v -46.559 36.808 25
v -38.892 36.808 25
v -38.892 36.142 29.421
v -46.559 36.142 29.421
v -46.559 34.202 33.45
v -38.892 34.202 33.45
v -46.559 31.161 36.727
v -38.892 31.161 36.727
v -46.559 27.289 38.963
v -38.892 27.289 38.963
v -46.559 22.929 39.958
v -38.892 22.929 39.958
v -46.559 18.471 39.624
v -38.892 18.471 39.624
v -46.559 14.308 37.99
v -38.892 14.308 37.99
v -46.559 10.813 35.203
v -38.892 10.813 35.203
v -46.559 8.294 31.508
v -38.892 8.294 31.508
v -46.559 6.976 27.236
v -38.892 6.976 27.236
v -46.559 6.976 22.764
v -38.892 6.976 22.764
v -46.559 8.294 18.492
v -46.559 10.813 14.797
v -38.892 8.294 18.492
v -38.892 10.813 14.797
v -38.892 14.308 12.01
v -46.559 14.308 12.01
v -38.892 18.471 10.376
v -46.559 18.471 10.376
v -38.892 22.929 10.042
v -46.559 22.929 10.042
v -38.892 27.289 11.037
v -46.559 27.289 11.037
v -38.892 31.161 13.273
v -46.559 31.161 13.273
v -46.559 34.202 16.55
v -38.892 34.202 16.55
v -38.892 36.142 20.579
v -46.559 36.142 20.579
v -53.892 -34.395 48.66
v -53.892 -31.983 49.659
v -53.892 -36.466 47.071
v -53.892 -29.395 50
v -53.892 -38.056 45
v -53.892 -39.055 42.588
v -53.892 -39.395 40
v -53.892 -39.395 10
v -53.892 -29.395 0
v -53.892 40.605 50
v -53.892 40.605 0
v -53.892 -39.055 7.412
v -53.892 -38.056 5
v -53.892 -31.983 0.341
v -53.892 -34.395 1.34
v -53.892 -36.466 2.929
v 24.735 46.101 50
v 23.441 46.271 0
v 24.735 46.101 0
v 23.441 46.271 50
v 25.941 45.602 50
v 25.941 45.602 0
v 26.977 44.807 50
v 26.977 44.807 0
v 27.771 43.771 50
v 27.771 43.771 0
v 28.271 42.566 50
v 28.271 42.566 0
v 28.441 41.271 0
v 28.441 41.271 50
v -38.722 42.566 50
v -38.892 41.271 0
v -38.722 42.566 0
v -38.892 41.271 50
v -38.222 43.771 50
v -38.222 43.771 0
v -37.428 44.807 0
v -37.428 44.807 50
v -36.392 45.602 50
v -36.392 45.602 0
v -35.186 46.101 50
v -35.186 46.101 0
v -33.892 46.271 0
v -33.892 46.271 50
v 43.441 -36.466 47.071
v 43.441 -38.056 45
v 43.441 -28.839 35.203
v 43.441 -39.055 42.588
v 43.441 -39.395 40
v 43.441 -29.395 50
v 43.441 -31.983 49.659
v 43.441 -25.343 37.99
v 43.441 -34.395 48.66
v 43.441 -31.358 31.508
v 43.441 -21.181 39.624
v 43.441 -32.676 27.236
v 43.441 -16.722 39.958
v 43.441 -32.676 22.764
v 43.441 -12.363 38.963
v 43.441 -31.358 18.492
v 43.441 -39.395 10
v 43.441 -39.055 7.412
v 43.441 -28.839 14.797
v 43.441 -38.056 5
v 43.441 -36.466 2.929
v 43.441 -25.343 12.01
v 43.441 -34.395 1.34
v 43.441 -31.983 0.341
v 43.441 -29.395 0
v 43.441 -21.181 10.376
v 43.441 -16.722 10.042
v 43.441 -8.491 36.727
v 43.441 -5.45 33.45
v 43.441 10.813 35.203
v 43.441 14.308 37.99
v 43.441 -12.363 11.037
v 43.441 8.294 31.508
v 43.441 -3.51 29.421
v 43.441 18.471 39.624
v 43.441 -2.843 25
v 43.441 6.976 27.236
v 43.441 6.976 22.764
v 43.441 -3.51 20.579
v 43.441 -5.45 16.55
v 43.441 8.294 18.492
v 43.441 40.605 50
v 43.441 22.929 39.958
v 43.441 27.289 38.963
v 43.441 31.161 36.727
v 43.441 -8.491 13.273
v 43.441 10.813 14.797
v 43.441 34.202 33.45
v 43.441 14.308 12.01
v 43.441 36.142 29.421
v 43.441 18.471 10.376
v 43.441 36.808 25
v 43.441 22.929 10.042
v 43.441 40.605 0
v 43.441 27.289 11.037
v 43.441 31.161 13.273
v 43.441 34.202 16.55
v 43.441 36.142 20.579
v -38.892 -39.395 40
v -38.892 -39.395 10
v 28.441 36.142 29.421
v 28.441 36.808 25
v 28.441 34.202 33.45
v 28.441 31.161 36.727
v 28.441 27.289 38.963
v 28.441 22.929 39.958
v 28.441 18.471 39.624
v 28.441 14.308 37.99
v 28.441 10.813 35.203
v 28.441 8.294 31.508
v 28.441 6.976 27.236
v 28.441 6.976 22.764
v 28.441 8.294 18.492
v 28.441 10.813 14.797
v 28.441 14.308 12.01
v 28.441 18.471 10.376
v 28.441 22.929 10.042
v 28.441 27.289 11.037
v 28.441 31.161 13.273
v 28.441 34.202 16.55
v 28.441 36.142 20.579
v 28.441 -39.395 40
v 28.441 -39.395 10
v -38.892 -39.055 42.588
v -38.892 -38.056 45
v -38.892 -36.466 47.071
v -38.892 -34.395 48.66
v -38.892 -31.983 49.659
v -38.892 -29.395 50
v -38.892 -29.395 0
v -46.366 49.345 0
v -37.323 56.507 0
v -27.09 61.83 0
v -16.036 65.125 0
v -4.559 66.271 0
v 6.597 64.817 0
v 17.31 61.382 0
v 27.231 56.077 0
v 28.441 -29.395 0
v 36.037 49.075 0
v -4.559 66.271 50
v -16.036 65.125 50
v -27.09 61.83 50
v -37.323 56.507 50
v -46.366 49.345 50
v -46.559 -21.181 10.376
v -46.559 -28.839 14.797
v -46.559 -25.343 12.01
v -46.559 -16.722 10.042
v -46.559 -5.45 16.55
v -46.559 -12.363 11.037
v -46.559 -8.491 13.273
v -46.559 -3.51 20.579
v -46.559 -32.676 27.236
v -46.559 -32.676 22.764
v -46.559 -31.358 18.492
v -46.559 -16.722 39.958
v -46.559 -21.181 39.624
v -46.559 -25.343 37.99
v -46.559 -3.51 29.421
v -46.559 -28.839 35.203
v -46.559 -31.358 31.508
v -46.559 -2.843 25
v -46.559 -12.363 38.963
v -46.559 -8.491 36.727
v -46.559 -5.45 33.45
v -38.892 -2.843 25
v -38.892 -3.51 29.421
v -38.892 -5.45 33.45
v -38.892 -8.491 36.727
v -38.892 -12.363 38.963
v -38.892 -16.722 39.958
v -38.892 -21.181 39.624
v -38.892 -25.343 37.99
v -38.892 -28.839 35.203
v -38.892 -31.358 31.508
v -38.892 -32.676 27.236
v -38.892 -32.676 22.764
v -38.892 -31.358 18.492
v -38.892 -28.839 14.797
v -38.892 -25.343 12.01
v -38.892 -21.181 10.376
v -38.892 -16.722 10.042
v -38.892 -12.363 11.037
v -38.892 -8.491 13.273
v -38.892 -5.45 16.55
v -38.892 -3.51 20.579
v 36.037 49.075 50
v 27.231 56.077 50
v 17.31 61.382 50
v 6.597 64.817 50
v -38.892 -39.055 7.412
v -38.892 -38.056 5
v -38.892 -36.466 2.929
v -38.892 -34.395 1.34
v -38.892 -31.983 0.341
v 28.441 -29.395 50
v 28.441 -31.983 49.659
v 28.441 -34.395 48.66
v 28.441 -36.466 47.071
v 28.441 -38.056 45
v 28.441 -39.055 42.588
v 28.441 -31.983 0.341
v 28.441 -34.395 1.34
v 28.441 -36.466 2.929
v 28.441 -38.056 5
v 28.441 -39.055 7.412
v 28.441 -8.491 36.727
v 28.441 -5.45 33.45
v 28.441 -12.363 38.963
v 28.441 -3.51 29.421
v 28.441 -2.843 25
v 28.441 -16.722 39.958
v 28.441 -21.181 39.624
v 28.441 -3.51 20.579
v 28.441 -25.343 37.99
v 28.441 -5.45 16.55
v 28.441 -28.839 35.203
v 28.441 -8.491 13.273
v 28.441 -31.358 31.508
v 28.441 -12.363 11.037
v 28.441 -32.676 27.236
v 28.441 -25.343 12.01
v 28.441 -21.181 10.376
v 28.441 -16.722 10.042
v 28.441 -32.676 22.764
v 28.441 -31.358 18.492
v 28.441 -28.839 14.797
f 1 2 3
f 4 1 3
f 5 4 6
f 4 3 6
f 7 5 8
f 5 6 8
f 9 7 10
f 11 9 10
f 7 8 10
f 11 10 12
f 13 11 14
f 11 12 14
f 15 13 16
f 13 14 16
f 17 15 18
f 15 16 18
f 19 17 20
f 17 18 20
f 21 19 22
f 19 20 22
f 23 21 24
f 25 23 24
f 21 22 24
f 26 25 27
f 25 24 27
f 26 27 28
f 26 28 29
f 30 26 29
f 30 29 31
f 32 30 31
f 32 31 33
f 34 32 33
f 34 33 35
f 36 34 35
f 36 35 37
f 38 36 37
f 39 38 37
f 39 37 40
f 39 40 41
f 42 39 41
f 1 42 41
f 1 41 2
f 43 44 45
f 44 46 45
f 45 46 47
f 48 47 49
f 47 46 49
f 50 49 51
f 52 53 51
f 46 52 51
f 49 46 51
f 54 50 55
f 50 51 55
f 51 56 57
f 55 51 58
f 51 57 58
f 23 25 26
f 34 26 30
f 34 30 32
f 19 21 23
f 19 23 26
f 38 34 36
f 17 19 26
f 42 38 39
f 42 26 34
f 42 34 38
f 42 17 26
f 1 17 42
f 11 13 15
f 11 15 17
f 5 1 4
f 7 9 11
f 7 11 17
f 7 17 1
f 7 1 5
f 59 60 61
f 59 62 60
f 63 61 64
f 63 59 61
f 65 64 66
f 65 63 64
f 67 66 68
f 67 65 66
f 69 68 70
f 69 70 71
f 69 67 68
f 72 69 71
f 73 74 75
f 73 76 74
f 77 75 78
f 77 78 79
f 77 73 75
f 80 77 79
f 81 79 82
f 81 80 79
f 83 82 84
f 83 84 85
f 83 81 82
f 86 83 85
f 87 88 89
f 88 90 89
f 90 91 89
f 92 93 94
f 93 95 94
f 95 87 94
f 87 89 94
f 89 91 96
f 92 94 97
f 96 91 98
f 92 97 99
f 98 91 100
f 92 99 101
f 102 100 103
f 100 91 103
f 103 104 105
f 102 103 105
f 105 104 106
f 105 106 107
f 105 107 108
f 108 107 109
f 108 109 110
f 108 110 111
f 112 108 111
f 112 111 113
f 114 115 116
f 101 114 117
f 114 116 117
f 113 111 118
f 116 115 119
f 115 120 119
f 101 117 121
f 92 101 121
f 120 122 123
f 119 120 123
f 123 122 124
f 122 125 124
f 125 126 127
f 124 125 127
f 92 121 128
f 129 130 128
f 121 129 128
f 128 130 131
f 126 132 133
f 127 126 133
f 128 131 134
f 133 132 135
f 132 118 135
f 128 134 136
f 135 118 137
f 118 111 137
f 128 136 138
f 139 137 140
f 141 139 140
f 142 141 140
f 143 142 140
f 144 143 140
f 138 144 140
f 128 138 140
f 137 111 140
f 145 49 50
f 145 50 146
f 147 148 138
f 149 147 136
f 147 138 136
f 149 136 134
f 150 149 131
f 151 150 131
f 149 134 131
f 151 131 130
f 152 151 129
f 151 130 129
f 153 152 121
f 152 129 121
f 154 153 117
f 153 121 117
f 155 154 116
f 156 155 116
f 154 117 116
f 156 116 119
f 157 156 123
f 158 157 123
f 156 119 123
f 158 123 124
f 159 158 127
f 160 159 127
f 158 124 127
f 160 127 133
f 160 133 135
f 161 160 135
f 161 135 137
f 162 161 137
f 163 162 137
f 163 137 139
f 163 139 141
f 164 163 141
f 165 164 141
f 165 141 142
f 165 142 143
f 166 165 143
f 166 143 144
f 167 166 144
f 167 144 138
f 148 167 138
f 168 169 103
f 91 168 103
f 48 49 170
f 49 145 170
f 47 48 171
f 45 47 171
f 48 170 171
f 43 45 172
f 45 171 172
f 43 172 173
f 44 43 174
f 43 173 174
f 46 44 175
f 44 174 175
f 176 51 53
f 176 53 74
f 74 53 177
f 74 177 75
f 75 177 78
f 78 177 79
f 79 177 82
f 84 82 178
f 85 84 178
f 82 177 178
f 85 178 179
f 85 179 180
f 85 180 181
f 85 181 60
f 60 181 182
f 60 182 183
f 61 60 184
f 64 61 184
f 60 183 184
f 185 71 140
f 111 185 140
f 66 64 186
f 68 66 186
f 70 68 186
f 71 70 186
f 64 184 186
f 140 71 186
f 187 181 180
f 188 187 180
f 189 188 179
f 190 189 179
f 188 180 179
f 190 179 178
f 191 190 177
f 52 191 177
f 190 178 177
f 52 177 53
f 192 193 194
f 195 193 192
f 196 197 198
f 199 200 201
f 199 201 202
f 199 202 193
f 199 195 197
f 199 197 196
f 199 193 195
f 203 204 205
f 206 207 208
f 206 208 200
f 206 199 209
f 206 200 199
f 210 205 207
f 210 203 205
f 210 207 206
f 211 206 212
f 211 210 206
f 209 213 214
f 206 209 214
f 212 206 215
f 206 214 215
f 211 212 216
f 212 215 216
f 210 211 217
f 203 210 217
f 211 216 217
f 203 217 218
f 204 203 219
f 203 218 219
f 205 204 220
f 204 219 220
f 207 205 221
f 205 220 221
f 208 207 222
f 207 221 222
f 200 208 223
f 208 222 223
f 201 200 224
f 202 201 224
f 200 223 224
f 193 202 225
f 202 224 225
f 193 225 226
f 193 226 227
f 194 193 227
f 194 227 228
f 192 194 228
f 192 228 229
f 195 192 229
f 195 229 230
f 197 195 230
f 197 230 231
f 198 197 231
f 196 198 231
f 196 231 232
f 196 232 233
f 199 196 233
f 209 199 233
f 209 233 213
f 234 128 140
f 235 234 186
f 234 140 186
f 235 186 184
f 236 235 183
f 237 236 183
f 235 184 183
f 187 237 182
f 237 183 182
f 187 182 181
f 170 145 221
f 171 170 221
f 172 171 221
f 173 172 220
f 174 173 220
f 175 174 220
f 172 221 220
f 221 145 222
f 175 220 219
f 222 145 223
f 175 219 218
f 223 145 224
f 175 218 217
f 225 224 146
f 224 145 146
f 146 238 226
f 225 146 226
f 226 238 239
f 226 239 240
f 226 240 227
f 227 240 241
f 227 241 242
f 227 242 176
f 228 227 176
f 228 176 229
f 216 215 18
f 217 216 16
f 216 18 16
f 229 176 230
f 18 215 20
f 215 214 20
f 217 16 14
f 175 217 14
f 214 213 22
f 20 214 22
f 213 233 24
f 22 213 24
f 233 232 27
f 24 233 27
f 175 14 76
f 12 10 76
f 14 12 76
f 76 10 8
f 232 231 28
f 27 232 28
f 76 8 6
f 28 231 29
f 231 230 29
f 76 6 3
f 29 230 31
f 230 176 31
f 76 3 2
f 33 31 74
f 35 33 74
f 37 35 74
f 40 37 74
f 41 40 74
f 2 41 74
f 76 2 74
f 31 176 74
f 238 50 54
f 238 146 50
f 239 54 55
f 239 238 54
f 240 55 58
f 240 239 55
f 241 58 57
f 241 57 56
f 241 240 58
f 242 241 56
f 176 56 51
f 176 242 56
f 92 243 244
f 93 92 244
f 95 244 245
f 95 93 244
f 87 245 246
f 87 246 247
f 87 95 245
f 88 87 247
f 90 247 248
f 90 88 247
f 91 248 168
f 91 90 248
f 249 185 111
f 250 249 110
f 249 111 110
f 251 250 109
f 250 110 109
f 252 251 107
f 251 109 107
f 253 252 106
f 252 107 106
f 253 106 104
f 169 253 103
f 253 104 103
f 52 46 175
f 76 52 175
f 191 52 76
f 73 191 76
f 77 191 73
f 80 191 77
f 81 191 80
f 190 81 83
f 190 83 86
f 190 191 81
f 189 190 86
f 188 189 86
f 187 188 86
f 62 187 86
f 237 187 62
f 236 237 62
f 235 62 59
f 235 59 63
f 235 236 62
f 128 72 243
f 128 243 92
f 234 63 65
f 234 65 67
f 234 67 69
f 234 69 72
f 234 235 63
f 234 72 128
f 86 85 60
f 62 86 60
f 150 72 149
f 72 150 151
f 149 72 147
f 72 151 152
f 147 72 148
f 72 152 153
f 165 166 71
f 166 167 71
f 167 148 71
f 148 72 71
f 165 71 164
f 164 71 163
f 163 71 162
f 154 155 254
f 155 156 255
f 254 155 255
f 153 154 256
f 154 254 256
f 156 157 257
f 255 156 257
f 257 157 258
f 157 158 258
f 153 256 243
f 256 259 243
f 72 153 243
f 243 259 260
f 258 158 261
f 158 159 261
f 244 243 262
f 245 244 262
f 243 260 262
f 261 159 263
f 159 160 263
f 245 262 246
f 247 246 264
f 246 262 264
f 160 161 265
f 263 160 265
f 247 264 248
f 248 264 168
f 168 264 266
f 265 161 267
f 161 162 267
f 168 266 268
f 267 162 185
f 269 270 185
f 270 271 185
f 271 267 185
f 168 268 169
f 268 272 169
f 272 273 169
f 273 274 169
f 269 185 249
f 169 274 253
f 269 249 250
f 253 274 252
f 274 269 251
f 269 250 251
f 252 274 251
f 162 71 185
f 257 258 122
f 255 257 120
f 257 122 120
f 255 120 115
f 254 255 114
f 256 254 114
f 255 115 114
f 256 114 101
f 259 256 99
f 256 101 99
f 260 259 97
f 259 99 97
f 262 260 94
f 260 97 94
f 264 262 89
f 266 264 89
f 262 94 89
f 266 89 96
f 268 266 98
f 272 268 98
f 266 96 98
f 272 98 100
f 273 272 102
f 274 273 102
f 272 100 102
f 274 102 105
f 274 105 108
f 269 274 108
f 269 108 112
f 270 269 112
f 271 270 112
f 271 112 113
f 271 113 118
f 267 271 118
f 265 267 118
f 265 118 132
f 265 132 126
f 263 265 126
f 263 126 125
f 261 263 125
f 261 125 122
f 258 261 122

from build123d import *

# Parameters (mm, degrees)
F1_DEPTH = 50
F2_R     = 15
F3_DEPTH = 90
F4_R     = 10
F5_R     = 5


with BuildPart() as f1:
    # F0 (on Top) → F1 (new body)
    with BuildSketch(Plane.XY):
        with BuildLine():
            Line((-53.892129, 40.60475), (-53.892129, -39.39525))
            Line((-53.892129, -39.39525), (-38.892129, -39.39525))
            Line((-38.892129, -39.39525), (-38.892129, 46.271418))
            Line((-38.892129, 46.271418), (28.441196, 46.271418))
            Line((28.441196, 46.271418), (28.441196, -39.39525))
            Line((28.441196, -39.39525), (43.441196, -39.39525))
            Line((43.441196, -39.39525), (43.441196, 40.60475))
            ThreePointArc((43.441196, 40.60475), (22.390443, 58.953554), (-4.5588, 66.271418))
            ThreePointArc((-4.5588, 66.271418), (-32.33335, 59.411682), (-53.892129, 40.60475))
        make_face()
    extrude(amount=F1_DEPTH)

    # F2 (on face) → F3 (cut)
    with BuildSketch(Plane.YZ.offset(43.441196)):
        with Locations((-17.843239, 25)):
            Circle(F2_R)
        with Locations((21.808403, 25)):
            Circle(F2_R)
    extrude(amount=-F3_DEPTH, mode=Mode.SUBTRACT)

    # F4
    f4_edges = [f1.edges().sort_by_distance(p)[0] for p in [
        (-46.392129, -39.39525, 50),
        (-46.392129, -39.39525, 0),
        (35.941196, -39.39525, 50),
        (35.941196, -39.39525, 0),
    ]]
    fillet(f4_edges, radius=F4_R)

    # F5
    f5_edges = [f1.edges().sort_by_distance(p)[0] for p in [
        (28.441196, 46.271418, 25),
        (-38.892129, 46.271418, 25),
    ]]
    fillet(f5_edges, radius=F5_R)


solid = f1.part
